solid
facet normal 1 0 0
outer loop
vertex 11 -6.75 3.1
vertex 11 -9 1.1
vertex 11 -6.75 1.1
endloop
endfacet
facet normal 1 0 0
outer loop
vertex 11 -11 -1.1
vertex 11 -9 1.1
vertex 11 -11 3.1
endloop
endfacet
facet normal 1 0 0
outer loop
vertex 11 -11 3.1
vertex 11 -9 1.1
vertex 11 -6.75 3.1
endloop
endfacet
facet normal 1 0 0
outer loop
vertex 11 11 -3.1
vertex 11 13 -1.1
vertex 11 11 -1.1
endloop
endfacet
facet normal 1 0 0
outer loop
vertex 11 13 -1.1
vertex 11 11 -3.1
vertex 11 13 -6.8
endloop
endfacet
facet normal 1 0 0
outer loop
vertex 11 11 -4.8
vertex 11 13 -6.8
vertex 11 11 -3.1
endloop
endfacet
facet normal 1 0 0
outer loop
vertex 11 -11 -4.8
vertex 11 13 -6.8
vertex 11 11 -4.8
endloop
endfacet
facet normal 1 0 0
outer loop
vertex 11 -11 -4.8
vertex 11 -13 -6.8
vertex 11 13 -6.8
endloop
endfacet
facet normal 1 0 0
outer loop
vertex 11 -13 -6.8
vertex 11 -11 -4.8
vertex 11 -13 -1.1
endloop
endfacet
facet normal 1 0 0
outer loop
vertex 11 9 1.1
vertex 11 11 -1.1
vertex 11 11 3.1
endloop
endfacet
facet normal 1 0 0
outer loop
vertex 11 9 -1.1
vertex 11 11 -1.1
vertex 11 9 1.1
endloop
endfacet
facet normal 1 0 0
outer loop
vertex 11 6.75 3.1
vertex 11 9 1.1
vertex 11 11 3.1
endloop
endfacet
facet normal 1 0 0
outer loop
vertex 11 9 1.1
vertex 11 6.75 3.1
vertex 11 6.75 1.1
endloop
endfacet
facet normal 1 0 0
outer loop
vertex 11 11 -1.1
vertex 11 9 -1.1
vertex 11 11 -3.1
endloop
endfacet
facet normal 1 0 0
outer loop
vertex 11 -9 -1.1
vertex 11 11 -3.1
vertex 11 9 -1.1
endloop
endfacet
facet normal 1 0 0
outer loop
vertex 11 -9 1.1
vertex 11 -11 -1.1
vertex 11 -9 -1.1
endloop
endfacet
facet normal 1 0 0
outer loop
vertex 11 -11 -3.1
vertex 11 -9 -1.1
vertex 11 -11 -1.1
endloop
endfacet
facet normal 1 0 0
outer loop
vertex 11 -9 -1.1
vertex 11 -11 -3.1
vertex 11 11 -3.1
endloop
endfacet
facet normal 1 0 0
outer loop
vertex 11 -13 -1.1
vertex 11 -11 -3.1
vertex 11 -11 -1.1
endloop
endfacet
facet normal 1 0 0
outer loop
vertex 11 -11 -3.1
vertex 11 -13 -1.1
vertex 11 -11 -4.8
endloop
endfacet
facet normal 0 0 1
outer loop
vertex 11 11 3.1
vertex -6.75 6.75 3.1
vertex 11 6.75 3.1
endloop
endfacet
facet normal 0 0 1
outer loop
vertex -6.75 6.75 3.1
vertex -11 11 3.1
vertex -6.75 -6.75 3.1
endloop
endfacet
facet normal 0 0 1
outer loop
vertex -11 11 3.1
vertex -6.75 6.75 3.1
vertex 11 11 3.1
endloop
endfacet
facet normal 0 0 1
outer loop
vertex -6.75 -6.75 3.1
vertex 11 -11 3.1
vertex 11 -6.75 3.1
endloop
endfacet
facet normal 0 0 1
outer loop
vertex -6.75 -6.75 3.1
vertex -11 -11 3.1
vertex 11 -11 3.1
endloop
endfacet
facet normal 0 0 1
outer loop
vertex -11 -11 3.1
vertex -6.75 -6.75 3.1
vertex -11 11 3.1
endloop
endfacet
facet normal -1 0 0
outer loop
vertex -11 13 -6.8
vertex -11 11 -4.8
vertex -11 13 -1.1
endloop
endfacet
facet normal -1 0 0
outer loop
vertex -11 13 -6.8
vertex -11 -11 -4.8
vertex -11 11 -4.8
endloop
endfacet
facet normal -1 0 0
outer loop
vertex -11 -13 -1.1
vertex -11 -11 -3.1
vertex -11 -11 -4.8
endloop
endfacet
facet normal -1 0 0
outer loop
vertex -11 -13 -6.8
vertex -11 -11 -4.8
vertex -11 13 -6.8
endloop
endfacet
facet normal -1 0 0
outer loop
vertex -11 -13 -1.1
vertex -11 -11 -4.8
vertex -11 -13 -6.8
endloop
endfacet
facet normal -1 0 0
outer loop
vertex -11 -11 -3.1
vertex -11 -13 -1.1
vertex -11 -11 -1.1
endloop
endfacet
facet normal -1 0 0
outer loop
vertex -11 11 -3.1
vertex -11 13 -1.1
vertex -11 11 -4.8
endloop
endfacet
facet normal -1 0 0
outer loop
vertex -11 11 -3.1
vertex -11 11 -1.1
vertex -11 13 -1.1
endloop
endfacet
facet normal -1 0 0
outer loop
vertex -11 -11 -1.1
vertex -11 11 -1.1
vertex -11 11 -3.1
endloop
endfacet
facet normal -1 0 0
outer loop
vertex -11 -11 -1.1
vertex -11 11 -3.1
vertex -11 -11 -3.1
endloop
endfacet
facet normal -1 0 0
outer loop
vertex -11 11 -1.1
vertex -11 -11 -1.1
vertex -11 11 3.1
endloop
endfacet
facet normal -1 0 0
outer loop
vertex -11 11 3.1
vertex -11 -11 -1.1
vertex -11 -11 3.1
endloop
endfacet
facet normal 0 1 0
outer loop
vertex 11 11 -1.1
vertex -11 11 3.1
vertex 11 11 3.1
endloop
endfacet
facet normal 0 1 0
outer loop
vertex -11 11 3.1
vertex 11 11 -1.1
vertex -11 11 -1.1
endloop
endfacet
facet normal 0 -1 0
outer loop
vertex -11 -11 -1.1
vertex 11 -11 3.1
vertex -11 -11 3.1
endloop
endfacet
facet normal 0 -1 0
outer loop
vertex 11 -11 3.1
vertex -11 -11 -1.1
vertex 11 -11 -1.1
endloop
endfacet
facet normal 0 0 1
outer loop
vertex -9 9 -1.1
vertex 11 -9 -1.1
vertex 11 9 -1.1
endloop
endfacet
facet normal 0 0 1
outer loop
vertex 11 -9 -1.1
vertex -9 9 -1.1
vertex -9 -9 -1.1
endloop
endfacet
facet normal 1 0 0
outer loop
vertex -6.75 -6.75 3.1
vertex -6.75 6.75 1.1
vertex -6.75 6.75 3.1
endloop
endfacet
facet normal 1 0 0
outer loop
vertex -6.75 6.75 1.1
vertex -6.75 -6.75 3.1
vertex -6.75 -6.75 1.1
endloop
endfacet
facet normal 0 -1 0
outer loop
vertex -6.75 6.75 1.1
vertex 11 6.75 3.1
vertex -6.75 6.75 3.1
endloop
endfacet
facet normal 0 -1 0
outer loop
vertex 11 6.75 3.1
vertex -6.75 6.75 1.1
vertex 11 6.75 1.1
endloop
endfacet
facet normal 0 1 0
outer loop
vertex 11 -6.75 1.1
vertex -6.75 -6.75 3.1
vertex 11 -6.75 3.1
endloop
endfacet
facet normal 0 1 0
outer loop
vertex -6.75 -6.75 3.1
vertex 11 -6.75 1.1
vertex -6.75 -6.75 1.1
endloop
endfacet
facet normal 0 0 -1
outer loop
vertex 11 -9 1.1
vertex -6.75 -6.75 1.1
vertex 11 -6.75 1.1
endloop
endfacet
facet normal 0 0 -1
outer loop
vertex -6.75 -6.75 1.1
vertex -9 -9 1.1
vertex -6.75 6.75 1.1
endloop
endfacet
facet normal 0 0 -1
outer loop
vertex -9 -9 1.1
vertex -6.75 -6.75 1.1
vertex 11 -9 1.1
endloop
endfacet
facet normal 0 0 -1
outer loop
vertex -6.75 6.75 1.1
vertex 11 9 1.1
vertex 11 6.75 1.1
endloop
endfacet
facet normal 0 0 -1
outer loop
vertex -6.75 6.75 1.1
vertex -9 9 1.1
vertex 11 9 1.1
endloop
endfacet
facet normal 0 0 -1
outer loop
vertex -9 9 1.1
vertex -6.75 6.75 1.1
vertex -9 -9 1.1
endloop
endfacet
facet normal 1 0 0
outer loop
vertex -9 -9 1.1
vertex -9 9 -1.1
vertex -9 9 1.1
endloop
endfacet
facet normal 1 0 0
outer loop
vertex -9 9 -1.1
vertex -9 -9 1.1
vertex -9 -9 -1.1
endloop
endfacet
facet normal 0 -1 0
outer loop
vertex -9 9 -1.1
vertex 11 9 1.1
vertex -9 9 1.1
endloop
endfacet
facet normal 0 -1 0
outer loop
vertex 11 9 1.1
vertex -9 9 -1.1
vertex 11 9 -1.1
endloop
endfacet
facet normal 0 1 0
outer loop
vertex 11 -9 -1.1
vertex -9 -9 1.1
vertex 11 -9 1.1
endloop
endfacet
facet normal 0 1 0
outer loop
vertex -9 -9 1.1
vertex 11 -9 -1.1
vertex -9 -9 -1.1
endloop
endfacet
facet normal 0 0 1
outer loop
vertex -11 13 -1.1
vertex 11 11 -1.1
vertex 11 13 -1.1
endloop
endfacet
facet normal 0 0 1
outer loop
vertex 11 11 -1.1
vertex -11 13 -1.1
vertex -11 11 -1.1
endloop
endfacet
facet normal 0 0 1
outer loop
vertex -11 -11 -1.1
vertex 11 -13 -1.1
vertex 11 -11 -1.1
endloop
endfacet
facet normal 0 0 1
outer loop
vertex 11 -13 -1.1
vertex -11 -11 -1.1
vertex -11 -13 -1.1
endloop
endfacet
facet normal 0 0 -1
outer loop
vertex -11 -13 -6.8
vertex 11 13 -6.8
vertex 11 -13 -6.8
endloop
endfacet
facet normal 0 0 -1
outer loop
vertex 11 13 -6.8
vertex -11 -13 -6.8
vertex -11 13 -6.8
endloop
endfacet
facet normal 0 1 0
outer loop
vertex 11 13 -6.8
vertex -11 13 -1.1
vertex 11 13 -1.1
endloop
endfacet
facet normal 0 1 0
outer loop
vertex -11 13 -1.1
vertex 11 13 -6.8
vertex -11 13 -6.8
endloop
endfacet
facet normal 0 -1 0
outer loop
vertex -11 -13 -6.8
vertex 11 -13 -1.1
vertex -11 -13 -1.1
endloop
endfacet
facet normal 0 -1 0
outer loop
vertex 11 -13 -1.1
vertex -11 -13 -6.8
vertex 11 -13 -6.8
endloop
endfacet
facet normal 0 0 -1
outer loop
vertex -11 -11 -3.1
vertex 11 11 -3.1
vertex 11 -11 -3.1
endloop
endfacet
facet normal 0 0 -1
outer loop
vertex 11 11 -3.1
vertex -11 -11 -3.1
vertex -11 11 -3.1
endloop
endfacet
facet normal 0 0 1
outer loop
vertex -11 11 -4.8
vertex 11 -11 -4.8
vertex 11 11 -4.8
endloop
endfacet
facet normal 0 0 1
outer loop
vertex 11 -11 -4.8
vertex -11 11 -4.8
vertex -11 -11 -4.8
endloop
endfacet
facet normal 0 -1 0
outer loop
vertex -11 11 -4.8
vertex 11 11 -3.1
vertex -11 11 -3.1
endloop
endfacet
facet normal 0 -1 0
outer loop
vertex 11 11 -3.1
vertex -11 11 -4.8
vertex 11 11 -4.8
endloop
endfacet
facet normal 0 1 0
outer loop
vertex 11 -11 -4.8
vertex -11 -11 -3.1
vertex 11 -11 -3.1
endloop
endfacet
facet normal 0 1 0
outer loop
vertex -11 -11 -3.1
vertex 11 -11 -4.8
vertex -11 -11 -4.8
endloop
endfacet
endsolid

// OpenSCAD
light_tab_width = 18.0; //mm
light_tab_thickness = 2.2; //mm
light_stub_width = 13.5; //mm
light_mount_thickness = 2; //mm

rack_tab_width = 22; //mm
rack_tab_height = light_tab_width + 2 * light_mount_thickness;
rack_mount_thickness = 2; //mm
rack_tab_thickness = 1.7; //mm

module light_mount() {
  difference() {
    // main body
    cube([
        light_tab_width + 2 * light_mount_thickness,
        light_tab_width + 2 * light_mount_thickness,
        light_tab_thickness + 2 * light_mount_thickness],
      center = true);

    // stub cutout
    translate([light_stub_width/2,0, light_mount_thickness]) {
      cube([
            2 * light_stub_width,
            light_stub_width,
            light_tab_thickness + 2 * light_mount_thickness],
          center = true);
    }

    translate([light_tab_width/2,0, 0]) {
      cube([
            2 * light_tab_width,
            light_tab_width,
            light_tab_thickness],
          center = true);
    }
  }
}

module rack_mount() {
  difference() {
    cube([
          rack_tab_height,
          rack_tab_width + 2 * rack_mount_thickness,
          rack_tab_thickness + 2 * rack_mount_thickness],
        center=true);
    cube([
          rack_tab_height + 0.1,
          rack_tab_width,
          rack_tab_thickness],
         center=true);
  }
}

union() {
  light_mount();
  translate([
             0,
             0,
             -light_tab_thickness/2 - light_mount_thickness
             - rack_tab_thickness/2]) {
    rack_mount();
  }
}
